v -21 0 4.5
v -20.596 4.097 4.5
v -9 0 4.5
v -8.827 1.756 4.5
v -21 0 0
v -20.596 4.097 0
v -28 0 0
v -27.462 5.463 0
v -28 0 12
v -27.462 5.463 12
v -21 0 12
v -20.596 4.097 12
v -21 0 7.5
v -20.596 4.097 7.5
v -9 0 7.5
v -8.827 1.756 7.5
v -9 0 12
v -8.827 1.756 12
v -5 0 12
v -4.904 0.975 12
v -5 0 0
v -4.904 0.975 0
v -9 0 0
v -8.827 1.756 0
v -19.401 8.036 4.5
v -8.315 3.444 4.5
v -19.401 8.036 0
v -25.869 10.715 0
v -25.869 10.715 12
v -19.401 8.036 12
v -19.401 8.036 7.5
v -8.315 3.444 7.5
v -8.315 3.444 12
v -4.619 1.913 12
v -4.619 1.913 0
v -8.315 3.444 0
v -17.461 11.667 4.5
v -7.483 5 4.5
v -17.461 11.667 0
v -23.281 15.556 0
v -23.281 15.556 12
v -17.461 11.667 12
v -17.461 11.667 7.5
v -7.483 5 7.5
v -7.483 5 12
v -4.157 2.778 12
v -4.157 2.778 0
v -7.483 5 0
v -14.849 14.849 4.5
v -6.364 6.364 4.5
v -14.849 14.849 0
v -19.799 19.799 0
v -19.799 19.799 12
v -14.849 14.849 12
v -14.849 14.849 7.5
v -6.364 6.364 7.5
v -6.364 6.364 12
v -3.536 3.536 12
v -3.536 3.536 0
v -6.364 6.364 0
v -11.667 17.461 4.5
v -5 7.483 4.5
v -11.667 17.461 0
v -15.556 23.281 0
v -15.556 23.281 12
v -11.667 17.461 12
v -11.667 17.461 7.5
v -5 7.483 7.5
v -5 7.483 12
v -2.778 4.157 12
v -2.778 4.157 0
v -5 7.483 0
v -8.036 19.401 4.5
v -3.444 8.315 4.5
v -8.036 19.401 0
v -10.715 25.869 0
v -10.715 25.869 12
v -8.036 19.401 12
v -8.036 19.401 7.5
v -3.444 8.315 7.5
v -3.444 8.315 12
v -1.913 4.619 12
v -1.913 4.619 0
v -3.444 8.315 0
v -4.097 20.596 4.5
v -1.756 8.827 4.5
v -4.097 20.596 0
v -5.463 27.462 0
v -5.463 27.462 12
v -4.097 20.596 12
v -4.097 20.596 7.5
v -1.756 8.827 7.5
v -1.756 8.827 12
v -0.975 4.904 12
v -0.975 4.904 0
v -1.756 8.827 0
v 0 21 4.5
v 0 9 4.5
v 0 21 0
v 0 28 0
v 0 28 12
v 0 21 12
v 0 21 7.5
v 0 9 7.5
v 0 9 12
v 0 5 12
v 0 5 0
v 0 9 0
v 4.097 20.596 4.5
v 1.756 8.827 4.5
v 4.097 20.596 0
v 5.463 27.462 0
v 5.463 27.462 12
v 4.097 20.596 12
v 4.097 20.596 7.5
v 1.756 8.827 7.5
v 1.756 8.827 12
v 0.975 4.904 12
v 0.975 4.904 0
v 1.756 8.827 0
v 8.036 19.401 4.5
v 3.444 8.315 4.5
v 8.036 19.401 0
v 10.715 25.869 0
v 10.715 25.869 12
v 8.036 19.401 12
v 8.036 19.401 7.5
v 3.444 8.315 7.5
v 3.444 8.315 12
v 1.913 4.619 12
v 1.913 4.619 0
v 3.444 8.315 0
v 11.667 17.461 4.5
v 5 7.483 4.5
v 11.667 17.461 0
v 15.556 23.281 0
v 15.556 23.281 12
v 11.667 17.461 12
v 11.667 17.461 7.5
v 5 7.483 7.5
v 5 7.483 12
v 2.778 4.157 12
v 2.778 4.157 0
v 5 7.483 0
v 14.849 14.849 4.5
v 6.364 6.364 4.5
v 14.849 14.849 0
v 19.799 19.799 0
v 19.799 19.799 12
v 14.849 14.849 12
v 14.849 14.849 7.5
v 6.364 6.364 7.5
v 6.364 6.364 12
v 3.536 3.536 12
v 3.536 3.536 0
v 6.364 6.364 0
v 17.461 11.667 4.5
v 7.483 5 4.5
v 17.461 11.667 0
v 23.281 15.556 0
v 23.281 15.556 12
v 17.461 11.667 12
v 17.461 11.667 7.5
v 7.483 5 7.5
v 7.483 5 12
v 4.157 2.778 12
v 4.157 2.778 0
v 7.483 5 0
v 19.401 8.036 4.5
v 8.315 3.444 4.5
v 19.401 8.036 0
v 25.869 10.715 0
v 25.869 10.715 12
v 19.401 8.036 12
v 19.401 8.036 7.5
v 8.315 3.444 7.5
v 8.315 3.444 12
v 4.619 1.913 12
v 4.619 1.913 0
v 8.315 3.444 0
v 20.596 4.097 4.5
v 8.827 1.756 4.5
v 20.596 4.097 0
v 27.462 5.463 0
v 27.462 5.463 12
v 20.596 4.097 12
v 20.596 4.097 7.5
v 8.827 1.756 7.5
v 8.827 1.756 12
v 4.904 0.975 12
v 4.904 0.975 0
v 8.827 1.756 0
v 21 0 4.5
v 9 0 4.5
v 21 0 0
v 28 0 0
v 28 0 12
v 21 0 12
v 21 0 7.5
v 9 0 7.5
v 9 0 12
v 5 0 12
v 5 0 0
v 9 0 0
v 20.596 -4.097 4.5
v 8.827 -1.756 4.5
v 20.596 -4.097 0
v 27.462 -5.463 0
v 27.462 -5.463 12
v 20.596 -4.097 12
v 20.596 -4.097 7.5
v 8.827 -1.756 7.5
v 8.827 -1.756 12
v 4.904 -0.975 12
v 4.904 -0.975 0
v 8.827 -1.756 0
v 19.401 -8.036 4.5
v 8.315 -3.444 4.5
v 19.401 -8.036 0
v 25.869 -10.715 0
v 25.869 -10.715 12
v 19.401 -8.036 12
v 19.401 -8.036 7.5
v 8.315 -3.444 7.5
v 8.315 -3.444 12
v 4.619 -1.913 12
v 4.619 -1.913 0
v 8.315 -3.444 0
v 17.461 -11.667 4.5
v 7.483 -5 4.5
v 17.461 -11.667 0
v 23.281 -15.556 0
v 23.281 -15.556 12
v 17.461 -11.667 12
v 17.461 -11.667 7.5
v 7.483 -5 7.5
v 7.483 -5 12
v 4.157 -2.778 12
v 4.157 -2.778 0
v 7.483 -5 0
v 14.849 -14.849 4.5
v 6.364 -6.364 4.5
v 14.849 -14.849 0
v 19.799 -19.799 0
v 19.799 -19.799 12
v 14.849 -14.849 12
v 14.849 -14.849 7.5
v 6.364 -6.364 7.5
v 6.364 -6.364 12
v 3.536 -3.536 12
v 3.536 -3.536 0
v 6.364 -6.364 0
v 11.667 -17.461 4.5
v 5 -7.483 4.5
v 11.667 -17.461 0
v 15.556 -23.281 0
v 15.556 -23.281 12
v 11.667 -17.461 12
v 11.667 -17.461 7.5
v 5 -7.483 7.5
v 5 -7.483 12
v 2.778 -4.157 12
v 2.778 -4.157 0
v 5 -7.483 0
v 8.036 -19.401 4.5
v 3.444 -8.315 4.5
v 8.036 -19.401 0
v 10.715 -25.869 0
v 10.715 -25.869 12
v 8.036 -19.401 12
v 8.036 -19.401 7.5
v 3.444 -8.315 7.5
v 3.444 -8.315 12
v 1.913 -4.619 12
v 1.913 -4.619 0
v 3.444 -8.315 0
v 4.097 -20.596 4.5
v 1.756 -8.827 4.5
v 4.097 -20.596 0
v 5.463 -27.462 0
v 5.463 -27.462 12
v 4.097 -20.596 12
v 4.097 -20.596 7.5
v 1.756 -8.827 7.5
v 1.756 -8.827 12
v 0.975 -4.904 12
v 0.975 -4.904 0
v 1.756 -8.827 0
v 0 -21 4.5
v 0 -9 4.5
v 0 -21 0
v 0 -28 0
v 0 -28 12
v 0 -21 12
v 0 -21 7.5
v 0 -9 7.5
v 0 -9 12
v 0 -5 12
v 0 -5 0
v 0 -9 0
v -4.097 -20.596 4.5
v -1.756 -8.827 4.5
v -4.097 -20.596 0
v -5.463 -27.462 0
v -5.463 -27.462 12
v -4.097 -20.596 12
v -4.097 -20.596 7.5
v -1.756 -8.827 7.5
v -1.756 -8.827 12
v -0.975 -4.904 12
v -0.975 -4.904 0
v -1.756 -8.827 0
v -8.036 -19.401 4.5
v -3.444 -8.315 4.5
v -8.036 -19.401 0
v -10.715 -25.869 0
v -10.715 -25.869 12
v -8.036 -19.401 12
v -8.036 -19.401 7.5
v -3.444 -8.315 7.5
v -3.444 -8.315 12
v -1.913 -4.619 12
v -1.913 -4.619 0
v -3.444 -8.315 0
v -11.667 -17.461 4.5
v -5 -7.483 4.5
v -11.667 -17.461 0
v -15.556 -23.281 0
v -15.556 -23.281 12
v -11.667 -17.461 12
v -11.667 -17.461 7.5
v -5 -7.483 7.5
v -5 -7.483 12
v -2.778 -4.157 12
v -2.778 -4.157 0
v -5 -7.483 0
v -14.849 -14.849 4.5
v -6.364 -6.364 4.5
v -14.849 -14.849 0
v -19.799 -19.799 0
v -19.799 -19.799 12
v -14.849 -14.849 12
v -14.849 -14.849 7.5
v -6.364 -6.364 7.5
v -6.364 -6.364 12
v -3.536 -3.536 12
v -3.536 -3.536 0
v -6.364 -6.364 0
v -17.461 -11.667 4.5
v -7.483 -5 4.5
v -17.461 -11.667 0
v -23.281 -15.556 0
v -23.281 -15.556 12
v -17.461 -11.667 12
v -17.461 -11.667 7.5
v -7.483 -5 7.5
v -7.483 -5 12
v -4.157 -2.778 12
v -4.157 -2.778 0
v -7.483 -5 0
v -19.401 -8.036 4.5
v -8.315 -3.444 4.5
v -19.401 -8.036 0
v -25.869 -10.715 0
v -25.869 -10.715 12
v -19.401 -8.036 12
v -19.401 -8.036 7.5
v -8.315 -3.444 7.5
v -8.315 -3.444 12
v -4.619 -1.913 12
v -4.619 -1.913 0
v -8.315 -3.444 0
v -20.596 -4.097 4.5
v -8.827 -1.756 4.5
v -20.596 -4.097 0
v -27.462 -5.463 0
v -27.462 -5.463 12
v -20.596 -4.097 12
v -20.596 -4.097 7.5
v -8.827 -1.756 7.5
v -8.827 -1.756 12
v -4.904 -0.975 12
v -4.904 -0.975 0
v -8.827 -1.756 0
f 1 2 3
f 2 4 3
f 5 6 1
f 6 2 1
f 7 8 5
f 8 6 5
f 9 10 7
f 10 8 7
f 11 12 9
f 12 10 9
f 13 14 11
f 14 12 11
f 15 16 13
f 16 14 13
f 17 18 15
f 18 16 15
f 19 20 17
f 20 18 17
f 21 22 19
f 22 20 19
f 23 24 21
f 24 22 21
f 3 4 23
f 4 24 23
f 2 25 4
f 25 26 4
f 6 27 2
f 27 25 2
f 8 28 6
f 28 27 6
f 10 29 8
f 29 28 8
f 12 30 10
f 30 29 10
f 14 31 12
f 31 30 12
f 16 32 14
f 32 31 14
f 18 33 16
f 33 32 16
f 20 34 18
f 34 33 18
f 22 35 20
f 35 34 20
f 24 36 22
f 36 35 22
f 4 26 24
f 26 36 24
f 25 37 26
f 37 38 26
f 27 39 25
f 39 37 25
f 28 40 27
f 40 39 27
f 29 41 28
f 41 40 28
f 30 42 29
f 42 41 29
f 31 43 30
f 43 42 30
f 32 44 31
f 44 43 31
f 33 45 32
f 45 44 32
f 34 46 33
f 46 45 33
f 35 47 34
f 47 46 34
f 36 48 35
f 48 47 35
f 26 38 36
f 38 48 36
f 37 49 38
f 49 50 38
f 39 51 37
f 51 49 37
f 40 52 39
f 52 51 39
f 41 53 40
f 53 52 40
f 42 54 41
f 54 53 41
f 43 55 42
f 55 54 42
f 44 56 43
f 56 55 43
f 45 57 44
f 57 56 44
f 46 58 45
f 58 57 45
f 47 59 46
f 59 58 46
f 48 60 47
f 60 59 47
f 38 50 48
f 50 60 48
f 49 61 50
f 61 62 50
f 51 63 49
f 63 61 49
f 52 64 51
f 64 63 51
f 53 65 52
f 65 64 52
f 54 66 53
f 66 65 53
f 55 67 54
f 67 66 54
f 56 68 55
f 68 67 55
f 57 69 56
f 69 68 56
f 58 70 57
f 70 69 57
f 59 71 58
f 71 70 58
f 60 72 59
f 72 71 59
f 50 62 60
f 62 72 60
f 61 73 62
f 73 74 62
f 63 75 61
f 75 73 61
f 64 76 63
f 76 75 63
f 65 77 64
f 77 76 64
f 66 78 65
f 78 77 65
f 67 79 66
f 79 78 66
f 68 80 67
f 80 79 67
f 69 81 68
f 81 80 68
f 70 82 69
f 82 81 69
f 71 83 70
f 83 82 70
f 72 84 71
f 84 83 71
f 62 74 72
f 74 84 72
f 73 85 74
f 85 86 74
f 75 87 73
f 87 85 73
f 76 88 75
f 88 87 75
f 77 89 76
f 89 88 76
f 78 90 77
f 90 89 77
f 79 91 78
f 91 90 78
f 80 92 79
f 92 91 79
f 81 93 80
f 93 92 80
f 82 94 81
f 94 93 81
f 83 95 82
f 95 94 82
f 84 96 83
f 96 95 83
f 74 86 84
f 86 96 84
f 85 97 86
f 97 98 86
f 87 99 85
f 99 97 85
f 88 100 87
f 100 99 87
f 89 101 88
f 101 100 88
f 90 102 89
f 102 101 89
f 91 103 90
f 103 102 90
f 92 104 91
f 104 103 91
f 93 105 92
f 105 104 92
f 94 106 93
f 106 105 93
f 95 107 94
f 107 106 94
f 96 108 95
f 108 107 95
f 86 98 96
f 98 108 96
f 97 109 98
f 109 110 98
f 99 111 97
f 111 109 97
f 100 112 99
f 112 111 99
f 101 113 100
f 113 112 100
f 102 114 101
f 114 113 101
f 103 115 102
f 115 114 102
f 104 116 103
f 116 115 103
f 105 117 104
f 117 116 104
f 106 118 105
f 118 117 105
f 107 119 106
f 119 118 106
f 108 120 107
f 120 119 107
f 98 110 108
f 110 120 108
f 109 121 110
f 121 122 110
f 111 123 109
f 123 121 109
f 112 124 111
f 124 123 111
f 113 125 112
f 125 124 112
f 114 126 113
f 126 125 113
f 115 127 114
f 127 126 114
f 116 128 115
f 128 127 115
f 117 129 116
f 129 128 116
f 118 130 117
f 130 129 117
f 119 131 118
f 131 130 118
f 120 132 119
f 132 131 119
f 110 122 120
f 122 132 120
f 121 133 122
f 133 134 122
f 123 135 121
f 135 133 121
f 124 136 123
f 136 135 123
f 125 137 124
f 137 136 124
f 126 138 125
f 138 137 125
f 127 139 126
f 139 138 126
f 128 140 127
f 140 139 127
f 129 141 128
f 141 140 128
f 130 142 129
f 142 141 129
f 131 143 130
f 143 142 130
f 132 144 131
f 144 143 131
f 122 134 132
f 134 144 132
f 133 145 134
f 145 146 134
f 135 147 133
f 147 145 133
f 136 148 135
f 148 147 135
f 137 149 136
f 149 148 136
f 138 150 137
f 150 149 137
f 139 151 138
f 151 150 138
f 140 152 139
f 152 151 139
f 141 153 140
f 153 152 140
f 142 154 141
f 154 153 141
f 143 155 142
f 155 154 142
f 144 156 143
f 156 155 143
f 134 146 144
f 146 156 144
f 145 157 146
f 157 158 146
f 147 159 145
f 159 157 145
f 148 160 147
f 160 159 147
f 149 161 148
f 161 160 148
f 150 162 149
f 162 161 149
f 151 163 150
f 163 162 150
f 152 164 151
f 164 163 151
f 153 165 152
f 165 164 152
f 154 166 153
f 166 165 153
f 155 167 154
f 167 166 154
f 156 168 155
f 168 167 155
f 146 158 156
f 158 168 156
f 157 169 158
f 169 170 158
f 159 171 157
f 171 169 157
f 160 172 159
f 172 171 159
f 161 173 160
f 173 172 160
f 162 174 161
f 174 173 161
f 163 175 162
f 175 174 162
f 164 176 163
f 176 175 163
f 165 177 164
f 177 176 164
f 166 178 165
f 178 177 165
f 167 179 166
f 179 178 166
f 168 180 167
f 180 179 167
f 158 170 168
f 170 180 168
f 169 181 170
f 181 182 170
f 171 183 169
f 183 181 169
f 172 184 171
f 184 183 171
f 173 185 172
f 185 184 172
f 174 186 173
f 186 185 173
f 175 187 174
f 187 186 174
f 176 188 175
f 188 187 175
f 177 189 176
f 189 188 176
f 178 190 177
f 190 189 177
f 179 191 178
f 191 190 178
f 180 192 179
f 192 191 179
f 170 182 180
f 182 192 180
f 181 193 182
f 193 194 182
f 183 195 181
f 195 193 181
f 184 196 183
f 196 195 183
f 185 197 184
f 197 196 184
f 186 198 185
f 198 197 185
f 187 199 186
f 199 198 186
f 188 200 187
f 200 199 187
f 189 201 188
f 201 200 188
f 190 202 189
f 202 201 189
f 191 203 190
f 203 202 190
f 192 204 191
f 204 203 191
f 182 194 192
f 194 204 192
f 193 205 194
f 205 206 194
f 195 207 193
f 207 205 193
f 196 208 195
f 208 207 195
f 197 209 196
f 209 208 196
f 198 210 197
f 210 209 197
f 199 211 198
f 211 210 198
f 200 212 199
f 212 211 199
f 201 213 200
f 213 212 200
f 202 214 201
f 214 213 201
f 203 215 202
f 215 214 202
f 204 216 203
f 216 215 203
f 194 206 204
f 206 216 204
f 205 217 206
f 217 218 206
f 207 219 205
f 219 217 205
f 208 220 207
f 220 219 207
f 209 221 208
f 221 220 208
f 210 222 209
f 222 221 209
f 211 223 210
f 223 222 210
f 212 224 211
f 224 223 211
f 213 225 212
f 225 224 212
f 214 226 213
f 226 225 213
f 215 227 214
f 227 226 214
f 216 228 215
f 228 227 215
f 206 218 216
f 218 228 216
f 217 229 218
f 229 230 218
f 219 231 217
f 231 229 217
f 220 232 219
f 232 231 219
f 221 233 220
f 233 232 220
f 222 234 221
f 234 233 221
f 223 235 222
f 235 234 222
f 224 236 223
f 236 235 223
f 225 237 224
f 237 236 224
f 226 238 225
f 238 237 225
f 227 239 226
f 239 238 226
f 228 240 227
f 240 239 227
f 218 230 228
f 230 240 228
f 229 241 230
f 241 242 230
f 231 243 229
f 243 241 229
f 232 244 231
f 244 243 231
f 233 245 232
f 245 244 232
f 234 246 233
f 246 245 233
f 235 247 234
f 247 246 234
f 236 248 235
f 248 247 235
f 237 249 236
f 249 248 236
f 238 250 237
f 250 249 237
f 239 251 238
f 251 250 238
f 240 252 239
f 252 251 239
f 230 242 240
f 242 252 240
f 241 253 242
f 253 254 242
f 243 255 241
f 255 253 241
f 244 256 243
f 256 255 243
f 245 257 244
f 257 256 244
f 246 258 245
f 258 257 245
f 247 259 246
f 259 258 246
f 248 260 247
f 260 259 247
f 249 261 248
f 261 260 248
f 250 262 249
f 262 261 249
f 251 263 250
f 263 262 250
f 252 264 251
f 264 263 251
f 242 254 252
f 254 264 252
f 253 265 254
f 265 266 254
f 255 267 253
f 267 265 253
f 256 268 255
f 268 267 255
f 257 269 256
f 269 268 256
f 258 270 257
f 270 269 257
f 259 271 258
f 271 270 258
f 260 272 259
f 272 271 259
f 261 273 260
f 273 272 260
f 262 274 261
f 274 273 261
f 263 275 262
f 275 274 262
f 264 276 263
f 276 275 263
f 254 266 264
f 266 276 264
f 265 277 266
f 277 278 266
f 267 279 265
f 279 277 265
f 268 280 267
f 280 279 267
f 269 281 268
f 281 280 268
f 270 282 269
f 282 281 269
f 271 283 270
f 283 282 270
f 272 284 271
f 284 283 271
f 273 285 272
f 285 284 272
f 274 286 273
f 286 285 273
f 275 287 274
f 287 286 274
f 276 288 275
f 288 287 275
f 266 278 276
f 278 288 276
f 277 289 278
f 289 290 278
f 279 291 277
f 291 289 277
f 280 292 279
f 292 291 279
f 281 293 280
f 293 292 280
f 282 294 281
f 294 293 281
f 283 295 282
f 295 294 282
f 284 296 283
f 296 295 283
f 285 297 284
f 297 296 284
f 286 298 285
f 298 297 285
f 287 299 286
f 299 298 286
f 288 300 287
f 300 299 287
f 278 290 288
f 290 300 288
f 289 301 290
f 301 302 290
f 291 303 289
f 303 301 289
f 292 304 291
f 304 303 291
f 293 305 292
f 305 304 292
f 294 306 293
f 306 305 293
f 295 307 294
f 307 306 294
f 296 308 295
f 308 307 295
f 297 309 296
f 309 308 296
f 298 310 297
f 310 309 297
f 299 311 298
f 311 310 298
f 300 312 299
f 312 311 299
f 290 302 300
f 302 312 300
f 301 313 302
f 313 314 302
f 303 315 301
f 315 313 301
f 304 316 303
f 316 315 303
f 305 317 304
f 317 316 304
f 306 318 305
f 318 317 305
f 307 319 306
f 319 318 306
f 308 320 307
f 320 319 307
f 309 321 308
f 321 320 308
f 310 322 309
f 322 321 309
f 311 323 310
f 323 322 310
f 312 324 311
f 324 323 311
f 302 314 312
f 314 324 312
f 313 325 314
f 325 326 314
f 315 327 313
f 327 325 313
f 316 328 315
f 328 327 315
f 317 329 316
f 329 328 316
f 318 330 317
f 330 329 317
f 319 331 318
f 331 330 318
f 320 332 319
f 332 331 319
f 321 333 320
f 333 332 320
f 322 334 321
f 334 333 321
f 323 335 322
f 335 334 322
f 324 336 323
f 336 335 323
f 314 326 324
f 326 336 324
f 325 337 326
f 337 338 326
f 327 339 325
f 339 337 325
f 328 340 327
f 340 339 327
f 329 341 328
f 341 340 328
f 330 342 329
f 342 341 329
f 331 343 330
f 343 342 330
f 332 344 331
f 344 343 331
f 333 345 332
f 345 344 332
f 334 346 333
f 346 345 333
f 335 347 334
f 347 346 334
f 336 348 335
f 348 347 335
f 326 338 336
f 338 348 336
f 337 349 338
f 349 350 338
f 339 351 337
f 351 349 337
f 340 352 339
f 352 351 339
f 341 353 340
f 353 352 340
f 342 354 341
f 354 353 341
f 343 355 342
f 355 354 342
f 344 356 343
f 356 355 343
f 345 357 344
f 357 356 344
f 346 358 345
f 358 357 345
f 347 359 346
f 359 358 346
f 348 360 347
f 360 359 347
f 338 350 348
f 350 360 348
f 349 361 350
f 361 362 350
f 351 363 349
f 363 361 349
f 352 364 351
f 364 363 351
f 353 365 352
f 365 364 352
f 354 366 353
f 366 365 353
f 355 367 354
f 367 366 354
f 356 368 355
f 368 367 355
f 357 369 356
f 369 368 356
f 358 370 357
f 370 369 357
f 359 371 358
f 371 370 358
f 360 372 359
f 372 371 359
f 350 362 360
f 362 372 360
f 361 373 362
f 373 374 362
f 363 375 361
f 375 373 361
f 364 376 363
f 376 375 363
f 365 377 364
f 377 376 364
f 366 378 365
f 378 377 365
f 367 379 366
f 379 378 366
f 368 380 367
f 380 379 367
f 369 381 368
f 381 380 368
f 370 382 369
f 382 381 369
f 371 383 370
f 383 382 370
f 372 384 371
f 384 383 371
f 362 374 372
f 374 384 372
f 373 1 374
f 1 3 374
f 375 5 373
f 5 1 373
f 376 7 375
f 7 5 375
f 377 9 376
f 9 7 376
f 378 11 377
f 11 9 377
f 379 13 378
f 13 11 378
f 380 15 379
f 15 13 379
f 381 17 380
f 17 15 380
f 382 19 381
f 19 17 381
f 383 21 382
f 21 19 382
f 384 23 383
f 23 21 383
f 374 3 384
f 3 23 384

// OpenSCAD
$fn = 32;

// ----------------------------------------------------------------------
// Revolved part: handwheel R28
// ----------------------------------------------------------------------

// --- parameters (mm) ---
bore_r = 5;               // bore radius
rim_r = 28;               // rim radius
rim_w = 7;                // rim axial width
rim_t = 12;               // rim diameter height
hub_r = 9;                // hub radius
web_t = 3;                // web thickness
revolve_angle = 360;      // revolve sweep, degrees

bore_d = 2 * bore_r;
rim_d = 2 * rim_r;
hub_d = 2 * hub_r;

profile = [[5, 0], [9, 0], [9, 4.5], [21, 4.5], [21, 0], [28, 0], [28, 12], [21, 12], [21, 7.5], [9, 7.5], [9, 12], [5, 12]];  // primary outline, 12 points, counter clockwise

// --- the one profile operation ---
rotate_extrude(angle = revolve_angle) polygon(points = profile);
